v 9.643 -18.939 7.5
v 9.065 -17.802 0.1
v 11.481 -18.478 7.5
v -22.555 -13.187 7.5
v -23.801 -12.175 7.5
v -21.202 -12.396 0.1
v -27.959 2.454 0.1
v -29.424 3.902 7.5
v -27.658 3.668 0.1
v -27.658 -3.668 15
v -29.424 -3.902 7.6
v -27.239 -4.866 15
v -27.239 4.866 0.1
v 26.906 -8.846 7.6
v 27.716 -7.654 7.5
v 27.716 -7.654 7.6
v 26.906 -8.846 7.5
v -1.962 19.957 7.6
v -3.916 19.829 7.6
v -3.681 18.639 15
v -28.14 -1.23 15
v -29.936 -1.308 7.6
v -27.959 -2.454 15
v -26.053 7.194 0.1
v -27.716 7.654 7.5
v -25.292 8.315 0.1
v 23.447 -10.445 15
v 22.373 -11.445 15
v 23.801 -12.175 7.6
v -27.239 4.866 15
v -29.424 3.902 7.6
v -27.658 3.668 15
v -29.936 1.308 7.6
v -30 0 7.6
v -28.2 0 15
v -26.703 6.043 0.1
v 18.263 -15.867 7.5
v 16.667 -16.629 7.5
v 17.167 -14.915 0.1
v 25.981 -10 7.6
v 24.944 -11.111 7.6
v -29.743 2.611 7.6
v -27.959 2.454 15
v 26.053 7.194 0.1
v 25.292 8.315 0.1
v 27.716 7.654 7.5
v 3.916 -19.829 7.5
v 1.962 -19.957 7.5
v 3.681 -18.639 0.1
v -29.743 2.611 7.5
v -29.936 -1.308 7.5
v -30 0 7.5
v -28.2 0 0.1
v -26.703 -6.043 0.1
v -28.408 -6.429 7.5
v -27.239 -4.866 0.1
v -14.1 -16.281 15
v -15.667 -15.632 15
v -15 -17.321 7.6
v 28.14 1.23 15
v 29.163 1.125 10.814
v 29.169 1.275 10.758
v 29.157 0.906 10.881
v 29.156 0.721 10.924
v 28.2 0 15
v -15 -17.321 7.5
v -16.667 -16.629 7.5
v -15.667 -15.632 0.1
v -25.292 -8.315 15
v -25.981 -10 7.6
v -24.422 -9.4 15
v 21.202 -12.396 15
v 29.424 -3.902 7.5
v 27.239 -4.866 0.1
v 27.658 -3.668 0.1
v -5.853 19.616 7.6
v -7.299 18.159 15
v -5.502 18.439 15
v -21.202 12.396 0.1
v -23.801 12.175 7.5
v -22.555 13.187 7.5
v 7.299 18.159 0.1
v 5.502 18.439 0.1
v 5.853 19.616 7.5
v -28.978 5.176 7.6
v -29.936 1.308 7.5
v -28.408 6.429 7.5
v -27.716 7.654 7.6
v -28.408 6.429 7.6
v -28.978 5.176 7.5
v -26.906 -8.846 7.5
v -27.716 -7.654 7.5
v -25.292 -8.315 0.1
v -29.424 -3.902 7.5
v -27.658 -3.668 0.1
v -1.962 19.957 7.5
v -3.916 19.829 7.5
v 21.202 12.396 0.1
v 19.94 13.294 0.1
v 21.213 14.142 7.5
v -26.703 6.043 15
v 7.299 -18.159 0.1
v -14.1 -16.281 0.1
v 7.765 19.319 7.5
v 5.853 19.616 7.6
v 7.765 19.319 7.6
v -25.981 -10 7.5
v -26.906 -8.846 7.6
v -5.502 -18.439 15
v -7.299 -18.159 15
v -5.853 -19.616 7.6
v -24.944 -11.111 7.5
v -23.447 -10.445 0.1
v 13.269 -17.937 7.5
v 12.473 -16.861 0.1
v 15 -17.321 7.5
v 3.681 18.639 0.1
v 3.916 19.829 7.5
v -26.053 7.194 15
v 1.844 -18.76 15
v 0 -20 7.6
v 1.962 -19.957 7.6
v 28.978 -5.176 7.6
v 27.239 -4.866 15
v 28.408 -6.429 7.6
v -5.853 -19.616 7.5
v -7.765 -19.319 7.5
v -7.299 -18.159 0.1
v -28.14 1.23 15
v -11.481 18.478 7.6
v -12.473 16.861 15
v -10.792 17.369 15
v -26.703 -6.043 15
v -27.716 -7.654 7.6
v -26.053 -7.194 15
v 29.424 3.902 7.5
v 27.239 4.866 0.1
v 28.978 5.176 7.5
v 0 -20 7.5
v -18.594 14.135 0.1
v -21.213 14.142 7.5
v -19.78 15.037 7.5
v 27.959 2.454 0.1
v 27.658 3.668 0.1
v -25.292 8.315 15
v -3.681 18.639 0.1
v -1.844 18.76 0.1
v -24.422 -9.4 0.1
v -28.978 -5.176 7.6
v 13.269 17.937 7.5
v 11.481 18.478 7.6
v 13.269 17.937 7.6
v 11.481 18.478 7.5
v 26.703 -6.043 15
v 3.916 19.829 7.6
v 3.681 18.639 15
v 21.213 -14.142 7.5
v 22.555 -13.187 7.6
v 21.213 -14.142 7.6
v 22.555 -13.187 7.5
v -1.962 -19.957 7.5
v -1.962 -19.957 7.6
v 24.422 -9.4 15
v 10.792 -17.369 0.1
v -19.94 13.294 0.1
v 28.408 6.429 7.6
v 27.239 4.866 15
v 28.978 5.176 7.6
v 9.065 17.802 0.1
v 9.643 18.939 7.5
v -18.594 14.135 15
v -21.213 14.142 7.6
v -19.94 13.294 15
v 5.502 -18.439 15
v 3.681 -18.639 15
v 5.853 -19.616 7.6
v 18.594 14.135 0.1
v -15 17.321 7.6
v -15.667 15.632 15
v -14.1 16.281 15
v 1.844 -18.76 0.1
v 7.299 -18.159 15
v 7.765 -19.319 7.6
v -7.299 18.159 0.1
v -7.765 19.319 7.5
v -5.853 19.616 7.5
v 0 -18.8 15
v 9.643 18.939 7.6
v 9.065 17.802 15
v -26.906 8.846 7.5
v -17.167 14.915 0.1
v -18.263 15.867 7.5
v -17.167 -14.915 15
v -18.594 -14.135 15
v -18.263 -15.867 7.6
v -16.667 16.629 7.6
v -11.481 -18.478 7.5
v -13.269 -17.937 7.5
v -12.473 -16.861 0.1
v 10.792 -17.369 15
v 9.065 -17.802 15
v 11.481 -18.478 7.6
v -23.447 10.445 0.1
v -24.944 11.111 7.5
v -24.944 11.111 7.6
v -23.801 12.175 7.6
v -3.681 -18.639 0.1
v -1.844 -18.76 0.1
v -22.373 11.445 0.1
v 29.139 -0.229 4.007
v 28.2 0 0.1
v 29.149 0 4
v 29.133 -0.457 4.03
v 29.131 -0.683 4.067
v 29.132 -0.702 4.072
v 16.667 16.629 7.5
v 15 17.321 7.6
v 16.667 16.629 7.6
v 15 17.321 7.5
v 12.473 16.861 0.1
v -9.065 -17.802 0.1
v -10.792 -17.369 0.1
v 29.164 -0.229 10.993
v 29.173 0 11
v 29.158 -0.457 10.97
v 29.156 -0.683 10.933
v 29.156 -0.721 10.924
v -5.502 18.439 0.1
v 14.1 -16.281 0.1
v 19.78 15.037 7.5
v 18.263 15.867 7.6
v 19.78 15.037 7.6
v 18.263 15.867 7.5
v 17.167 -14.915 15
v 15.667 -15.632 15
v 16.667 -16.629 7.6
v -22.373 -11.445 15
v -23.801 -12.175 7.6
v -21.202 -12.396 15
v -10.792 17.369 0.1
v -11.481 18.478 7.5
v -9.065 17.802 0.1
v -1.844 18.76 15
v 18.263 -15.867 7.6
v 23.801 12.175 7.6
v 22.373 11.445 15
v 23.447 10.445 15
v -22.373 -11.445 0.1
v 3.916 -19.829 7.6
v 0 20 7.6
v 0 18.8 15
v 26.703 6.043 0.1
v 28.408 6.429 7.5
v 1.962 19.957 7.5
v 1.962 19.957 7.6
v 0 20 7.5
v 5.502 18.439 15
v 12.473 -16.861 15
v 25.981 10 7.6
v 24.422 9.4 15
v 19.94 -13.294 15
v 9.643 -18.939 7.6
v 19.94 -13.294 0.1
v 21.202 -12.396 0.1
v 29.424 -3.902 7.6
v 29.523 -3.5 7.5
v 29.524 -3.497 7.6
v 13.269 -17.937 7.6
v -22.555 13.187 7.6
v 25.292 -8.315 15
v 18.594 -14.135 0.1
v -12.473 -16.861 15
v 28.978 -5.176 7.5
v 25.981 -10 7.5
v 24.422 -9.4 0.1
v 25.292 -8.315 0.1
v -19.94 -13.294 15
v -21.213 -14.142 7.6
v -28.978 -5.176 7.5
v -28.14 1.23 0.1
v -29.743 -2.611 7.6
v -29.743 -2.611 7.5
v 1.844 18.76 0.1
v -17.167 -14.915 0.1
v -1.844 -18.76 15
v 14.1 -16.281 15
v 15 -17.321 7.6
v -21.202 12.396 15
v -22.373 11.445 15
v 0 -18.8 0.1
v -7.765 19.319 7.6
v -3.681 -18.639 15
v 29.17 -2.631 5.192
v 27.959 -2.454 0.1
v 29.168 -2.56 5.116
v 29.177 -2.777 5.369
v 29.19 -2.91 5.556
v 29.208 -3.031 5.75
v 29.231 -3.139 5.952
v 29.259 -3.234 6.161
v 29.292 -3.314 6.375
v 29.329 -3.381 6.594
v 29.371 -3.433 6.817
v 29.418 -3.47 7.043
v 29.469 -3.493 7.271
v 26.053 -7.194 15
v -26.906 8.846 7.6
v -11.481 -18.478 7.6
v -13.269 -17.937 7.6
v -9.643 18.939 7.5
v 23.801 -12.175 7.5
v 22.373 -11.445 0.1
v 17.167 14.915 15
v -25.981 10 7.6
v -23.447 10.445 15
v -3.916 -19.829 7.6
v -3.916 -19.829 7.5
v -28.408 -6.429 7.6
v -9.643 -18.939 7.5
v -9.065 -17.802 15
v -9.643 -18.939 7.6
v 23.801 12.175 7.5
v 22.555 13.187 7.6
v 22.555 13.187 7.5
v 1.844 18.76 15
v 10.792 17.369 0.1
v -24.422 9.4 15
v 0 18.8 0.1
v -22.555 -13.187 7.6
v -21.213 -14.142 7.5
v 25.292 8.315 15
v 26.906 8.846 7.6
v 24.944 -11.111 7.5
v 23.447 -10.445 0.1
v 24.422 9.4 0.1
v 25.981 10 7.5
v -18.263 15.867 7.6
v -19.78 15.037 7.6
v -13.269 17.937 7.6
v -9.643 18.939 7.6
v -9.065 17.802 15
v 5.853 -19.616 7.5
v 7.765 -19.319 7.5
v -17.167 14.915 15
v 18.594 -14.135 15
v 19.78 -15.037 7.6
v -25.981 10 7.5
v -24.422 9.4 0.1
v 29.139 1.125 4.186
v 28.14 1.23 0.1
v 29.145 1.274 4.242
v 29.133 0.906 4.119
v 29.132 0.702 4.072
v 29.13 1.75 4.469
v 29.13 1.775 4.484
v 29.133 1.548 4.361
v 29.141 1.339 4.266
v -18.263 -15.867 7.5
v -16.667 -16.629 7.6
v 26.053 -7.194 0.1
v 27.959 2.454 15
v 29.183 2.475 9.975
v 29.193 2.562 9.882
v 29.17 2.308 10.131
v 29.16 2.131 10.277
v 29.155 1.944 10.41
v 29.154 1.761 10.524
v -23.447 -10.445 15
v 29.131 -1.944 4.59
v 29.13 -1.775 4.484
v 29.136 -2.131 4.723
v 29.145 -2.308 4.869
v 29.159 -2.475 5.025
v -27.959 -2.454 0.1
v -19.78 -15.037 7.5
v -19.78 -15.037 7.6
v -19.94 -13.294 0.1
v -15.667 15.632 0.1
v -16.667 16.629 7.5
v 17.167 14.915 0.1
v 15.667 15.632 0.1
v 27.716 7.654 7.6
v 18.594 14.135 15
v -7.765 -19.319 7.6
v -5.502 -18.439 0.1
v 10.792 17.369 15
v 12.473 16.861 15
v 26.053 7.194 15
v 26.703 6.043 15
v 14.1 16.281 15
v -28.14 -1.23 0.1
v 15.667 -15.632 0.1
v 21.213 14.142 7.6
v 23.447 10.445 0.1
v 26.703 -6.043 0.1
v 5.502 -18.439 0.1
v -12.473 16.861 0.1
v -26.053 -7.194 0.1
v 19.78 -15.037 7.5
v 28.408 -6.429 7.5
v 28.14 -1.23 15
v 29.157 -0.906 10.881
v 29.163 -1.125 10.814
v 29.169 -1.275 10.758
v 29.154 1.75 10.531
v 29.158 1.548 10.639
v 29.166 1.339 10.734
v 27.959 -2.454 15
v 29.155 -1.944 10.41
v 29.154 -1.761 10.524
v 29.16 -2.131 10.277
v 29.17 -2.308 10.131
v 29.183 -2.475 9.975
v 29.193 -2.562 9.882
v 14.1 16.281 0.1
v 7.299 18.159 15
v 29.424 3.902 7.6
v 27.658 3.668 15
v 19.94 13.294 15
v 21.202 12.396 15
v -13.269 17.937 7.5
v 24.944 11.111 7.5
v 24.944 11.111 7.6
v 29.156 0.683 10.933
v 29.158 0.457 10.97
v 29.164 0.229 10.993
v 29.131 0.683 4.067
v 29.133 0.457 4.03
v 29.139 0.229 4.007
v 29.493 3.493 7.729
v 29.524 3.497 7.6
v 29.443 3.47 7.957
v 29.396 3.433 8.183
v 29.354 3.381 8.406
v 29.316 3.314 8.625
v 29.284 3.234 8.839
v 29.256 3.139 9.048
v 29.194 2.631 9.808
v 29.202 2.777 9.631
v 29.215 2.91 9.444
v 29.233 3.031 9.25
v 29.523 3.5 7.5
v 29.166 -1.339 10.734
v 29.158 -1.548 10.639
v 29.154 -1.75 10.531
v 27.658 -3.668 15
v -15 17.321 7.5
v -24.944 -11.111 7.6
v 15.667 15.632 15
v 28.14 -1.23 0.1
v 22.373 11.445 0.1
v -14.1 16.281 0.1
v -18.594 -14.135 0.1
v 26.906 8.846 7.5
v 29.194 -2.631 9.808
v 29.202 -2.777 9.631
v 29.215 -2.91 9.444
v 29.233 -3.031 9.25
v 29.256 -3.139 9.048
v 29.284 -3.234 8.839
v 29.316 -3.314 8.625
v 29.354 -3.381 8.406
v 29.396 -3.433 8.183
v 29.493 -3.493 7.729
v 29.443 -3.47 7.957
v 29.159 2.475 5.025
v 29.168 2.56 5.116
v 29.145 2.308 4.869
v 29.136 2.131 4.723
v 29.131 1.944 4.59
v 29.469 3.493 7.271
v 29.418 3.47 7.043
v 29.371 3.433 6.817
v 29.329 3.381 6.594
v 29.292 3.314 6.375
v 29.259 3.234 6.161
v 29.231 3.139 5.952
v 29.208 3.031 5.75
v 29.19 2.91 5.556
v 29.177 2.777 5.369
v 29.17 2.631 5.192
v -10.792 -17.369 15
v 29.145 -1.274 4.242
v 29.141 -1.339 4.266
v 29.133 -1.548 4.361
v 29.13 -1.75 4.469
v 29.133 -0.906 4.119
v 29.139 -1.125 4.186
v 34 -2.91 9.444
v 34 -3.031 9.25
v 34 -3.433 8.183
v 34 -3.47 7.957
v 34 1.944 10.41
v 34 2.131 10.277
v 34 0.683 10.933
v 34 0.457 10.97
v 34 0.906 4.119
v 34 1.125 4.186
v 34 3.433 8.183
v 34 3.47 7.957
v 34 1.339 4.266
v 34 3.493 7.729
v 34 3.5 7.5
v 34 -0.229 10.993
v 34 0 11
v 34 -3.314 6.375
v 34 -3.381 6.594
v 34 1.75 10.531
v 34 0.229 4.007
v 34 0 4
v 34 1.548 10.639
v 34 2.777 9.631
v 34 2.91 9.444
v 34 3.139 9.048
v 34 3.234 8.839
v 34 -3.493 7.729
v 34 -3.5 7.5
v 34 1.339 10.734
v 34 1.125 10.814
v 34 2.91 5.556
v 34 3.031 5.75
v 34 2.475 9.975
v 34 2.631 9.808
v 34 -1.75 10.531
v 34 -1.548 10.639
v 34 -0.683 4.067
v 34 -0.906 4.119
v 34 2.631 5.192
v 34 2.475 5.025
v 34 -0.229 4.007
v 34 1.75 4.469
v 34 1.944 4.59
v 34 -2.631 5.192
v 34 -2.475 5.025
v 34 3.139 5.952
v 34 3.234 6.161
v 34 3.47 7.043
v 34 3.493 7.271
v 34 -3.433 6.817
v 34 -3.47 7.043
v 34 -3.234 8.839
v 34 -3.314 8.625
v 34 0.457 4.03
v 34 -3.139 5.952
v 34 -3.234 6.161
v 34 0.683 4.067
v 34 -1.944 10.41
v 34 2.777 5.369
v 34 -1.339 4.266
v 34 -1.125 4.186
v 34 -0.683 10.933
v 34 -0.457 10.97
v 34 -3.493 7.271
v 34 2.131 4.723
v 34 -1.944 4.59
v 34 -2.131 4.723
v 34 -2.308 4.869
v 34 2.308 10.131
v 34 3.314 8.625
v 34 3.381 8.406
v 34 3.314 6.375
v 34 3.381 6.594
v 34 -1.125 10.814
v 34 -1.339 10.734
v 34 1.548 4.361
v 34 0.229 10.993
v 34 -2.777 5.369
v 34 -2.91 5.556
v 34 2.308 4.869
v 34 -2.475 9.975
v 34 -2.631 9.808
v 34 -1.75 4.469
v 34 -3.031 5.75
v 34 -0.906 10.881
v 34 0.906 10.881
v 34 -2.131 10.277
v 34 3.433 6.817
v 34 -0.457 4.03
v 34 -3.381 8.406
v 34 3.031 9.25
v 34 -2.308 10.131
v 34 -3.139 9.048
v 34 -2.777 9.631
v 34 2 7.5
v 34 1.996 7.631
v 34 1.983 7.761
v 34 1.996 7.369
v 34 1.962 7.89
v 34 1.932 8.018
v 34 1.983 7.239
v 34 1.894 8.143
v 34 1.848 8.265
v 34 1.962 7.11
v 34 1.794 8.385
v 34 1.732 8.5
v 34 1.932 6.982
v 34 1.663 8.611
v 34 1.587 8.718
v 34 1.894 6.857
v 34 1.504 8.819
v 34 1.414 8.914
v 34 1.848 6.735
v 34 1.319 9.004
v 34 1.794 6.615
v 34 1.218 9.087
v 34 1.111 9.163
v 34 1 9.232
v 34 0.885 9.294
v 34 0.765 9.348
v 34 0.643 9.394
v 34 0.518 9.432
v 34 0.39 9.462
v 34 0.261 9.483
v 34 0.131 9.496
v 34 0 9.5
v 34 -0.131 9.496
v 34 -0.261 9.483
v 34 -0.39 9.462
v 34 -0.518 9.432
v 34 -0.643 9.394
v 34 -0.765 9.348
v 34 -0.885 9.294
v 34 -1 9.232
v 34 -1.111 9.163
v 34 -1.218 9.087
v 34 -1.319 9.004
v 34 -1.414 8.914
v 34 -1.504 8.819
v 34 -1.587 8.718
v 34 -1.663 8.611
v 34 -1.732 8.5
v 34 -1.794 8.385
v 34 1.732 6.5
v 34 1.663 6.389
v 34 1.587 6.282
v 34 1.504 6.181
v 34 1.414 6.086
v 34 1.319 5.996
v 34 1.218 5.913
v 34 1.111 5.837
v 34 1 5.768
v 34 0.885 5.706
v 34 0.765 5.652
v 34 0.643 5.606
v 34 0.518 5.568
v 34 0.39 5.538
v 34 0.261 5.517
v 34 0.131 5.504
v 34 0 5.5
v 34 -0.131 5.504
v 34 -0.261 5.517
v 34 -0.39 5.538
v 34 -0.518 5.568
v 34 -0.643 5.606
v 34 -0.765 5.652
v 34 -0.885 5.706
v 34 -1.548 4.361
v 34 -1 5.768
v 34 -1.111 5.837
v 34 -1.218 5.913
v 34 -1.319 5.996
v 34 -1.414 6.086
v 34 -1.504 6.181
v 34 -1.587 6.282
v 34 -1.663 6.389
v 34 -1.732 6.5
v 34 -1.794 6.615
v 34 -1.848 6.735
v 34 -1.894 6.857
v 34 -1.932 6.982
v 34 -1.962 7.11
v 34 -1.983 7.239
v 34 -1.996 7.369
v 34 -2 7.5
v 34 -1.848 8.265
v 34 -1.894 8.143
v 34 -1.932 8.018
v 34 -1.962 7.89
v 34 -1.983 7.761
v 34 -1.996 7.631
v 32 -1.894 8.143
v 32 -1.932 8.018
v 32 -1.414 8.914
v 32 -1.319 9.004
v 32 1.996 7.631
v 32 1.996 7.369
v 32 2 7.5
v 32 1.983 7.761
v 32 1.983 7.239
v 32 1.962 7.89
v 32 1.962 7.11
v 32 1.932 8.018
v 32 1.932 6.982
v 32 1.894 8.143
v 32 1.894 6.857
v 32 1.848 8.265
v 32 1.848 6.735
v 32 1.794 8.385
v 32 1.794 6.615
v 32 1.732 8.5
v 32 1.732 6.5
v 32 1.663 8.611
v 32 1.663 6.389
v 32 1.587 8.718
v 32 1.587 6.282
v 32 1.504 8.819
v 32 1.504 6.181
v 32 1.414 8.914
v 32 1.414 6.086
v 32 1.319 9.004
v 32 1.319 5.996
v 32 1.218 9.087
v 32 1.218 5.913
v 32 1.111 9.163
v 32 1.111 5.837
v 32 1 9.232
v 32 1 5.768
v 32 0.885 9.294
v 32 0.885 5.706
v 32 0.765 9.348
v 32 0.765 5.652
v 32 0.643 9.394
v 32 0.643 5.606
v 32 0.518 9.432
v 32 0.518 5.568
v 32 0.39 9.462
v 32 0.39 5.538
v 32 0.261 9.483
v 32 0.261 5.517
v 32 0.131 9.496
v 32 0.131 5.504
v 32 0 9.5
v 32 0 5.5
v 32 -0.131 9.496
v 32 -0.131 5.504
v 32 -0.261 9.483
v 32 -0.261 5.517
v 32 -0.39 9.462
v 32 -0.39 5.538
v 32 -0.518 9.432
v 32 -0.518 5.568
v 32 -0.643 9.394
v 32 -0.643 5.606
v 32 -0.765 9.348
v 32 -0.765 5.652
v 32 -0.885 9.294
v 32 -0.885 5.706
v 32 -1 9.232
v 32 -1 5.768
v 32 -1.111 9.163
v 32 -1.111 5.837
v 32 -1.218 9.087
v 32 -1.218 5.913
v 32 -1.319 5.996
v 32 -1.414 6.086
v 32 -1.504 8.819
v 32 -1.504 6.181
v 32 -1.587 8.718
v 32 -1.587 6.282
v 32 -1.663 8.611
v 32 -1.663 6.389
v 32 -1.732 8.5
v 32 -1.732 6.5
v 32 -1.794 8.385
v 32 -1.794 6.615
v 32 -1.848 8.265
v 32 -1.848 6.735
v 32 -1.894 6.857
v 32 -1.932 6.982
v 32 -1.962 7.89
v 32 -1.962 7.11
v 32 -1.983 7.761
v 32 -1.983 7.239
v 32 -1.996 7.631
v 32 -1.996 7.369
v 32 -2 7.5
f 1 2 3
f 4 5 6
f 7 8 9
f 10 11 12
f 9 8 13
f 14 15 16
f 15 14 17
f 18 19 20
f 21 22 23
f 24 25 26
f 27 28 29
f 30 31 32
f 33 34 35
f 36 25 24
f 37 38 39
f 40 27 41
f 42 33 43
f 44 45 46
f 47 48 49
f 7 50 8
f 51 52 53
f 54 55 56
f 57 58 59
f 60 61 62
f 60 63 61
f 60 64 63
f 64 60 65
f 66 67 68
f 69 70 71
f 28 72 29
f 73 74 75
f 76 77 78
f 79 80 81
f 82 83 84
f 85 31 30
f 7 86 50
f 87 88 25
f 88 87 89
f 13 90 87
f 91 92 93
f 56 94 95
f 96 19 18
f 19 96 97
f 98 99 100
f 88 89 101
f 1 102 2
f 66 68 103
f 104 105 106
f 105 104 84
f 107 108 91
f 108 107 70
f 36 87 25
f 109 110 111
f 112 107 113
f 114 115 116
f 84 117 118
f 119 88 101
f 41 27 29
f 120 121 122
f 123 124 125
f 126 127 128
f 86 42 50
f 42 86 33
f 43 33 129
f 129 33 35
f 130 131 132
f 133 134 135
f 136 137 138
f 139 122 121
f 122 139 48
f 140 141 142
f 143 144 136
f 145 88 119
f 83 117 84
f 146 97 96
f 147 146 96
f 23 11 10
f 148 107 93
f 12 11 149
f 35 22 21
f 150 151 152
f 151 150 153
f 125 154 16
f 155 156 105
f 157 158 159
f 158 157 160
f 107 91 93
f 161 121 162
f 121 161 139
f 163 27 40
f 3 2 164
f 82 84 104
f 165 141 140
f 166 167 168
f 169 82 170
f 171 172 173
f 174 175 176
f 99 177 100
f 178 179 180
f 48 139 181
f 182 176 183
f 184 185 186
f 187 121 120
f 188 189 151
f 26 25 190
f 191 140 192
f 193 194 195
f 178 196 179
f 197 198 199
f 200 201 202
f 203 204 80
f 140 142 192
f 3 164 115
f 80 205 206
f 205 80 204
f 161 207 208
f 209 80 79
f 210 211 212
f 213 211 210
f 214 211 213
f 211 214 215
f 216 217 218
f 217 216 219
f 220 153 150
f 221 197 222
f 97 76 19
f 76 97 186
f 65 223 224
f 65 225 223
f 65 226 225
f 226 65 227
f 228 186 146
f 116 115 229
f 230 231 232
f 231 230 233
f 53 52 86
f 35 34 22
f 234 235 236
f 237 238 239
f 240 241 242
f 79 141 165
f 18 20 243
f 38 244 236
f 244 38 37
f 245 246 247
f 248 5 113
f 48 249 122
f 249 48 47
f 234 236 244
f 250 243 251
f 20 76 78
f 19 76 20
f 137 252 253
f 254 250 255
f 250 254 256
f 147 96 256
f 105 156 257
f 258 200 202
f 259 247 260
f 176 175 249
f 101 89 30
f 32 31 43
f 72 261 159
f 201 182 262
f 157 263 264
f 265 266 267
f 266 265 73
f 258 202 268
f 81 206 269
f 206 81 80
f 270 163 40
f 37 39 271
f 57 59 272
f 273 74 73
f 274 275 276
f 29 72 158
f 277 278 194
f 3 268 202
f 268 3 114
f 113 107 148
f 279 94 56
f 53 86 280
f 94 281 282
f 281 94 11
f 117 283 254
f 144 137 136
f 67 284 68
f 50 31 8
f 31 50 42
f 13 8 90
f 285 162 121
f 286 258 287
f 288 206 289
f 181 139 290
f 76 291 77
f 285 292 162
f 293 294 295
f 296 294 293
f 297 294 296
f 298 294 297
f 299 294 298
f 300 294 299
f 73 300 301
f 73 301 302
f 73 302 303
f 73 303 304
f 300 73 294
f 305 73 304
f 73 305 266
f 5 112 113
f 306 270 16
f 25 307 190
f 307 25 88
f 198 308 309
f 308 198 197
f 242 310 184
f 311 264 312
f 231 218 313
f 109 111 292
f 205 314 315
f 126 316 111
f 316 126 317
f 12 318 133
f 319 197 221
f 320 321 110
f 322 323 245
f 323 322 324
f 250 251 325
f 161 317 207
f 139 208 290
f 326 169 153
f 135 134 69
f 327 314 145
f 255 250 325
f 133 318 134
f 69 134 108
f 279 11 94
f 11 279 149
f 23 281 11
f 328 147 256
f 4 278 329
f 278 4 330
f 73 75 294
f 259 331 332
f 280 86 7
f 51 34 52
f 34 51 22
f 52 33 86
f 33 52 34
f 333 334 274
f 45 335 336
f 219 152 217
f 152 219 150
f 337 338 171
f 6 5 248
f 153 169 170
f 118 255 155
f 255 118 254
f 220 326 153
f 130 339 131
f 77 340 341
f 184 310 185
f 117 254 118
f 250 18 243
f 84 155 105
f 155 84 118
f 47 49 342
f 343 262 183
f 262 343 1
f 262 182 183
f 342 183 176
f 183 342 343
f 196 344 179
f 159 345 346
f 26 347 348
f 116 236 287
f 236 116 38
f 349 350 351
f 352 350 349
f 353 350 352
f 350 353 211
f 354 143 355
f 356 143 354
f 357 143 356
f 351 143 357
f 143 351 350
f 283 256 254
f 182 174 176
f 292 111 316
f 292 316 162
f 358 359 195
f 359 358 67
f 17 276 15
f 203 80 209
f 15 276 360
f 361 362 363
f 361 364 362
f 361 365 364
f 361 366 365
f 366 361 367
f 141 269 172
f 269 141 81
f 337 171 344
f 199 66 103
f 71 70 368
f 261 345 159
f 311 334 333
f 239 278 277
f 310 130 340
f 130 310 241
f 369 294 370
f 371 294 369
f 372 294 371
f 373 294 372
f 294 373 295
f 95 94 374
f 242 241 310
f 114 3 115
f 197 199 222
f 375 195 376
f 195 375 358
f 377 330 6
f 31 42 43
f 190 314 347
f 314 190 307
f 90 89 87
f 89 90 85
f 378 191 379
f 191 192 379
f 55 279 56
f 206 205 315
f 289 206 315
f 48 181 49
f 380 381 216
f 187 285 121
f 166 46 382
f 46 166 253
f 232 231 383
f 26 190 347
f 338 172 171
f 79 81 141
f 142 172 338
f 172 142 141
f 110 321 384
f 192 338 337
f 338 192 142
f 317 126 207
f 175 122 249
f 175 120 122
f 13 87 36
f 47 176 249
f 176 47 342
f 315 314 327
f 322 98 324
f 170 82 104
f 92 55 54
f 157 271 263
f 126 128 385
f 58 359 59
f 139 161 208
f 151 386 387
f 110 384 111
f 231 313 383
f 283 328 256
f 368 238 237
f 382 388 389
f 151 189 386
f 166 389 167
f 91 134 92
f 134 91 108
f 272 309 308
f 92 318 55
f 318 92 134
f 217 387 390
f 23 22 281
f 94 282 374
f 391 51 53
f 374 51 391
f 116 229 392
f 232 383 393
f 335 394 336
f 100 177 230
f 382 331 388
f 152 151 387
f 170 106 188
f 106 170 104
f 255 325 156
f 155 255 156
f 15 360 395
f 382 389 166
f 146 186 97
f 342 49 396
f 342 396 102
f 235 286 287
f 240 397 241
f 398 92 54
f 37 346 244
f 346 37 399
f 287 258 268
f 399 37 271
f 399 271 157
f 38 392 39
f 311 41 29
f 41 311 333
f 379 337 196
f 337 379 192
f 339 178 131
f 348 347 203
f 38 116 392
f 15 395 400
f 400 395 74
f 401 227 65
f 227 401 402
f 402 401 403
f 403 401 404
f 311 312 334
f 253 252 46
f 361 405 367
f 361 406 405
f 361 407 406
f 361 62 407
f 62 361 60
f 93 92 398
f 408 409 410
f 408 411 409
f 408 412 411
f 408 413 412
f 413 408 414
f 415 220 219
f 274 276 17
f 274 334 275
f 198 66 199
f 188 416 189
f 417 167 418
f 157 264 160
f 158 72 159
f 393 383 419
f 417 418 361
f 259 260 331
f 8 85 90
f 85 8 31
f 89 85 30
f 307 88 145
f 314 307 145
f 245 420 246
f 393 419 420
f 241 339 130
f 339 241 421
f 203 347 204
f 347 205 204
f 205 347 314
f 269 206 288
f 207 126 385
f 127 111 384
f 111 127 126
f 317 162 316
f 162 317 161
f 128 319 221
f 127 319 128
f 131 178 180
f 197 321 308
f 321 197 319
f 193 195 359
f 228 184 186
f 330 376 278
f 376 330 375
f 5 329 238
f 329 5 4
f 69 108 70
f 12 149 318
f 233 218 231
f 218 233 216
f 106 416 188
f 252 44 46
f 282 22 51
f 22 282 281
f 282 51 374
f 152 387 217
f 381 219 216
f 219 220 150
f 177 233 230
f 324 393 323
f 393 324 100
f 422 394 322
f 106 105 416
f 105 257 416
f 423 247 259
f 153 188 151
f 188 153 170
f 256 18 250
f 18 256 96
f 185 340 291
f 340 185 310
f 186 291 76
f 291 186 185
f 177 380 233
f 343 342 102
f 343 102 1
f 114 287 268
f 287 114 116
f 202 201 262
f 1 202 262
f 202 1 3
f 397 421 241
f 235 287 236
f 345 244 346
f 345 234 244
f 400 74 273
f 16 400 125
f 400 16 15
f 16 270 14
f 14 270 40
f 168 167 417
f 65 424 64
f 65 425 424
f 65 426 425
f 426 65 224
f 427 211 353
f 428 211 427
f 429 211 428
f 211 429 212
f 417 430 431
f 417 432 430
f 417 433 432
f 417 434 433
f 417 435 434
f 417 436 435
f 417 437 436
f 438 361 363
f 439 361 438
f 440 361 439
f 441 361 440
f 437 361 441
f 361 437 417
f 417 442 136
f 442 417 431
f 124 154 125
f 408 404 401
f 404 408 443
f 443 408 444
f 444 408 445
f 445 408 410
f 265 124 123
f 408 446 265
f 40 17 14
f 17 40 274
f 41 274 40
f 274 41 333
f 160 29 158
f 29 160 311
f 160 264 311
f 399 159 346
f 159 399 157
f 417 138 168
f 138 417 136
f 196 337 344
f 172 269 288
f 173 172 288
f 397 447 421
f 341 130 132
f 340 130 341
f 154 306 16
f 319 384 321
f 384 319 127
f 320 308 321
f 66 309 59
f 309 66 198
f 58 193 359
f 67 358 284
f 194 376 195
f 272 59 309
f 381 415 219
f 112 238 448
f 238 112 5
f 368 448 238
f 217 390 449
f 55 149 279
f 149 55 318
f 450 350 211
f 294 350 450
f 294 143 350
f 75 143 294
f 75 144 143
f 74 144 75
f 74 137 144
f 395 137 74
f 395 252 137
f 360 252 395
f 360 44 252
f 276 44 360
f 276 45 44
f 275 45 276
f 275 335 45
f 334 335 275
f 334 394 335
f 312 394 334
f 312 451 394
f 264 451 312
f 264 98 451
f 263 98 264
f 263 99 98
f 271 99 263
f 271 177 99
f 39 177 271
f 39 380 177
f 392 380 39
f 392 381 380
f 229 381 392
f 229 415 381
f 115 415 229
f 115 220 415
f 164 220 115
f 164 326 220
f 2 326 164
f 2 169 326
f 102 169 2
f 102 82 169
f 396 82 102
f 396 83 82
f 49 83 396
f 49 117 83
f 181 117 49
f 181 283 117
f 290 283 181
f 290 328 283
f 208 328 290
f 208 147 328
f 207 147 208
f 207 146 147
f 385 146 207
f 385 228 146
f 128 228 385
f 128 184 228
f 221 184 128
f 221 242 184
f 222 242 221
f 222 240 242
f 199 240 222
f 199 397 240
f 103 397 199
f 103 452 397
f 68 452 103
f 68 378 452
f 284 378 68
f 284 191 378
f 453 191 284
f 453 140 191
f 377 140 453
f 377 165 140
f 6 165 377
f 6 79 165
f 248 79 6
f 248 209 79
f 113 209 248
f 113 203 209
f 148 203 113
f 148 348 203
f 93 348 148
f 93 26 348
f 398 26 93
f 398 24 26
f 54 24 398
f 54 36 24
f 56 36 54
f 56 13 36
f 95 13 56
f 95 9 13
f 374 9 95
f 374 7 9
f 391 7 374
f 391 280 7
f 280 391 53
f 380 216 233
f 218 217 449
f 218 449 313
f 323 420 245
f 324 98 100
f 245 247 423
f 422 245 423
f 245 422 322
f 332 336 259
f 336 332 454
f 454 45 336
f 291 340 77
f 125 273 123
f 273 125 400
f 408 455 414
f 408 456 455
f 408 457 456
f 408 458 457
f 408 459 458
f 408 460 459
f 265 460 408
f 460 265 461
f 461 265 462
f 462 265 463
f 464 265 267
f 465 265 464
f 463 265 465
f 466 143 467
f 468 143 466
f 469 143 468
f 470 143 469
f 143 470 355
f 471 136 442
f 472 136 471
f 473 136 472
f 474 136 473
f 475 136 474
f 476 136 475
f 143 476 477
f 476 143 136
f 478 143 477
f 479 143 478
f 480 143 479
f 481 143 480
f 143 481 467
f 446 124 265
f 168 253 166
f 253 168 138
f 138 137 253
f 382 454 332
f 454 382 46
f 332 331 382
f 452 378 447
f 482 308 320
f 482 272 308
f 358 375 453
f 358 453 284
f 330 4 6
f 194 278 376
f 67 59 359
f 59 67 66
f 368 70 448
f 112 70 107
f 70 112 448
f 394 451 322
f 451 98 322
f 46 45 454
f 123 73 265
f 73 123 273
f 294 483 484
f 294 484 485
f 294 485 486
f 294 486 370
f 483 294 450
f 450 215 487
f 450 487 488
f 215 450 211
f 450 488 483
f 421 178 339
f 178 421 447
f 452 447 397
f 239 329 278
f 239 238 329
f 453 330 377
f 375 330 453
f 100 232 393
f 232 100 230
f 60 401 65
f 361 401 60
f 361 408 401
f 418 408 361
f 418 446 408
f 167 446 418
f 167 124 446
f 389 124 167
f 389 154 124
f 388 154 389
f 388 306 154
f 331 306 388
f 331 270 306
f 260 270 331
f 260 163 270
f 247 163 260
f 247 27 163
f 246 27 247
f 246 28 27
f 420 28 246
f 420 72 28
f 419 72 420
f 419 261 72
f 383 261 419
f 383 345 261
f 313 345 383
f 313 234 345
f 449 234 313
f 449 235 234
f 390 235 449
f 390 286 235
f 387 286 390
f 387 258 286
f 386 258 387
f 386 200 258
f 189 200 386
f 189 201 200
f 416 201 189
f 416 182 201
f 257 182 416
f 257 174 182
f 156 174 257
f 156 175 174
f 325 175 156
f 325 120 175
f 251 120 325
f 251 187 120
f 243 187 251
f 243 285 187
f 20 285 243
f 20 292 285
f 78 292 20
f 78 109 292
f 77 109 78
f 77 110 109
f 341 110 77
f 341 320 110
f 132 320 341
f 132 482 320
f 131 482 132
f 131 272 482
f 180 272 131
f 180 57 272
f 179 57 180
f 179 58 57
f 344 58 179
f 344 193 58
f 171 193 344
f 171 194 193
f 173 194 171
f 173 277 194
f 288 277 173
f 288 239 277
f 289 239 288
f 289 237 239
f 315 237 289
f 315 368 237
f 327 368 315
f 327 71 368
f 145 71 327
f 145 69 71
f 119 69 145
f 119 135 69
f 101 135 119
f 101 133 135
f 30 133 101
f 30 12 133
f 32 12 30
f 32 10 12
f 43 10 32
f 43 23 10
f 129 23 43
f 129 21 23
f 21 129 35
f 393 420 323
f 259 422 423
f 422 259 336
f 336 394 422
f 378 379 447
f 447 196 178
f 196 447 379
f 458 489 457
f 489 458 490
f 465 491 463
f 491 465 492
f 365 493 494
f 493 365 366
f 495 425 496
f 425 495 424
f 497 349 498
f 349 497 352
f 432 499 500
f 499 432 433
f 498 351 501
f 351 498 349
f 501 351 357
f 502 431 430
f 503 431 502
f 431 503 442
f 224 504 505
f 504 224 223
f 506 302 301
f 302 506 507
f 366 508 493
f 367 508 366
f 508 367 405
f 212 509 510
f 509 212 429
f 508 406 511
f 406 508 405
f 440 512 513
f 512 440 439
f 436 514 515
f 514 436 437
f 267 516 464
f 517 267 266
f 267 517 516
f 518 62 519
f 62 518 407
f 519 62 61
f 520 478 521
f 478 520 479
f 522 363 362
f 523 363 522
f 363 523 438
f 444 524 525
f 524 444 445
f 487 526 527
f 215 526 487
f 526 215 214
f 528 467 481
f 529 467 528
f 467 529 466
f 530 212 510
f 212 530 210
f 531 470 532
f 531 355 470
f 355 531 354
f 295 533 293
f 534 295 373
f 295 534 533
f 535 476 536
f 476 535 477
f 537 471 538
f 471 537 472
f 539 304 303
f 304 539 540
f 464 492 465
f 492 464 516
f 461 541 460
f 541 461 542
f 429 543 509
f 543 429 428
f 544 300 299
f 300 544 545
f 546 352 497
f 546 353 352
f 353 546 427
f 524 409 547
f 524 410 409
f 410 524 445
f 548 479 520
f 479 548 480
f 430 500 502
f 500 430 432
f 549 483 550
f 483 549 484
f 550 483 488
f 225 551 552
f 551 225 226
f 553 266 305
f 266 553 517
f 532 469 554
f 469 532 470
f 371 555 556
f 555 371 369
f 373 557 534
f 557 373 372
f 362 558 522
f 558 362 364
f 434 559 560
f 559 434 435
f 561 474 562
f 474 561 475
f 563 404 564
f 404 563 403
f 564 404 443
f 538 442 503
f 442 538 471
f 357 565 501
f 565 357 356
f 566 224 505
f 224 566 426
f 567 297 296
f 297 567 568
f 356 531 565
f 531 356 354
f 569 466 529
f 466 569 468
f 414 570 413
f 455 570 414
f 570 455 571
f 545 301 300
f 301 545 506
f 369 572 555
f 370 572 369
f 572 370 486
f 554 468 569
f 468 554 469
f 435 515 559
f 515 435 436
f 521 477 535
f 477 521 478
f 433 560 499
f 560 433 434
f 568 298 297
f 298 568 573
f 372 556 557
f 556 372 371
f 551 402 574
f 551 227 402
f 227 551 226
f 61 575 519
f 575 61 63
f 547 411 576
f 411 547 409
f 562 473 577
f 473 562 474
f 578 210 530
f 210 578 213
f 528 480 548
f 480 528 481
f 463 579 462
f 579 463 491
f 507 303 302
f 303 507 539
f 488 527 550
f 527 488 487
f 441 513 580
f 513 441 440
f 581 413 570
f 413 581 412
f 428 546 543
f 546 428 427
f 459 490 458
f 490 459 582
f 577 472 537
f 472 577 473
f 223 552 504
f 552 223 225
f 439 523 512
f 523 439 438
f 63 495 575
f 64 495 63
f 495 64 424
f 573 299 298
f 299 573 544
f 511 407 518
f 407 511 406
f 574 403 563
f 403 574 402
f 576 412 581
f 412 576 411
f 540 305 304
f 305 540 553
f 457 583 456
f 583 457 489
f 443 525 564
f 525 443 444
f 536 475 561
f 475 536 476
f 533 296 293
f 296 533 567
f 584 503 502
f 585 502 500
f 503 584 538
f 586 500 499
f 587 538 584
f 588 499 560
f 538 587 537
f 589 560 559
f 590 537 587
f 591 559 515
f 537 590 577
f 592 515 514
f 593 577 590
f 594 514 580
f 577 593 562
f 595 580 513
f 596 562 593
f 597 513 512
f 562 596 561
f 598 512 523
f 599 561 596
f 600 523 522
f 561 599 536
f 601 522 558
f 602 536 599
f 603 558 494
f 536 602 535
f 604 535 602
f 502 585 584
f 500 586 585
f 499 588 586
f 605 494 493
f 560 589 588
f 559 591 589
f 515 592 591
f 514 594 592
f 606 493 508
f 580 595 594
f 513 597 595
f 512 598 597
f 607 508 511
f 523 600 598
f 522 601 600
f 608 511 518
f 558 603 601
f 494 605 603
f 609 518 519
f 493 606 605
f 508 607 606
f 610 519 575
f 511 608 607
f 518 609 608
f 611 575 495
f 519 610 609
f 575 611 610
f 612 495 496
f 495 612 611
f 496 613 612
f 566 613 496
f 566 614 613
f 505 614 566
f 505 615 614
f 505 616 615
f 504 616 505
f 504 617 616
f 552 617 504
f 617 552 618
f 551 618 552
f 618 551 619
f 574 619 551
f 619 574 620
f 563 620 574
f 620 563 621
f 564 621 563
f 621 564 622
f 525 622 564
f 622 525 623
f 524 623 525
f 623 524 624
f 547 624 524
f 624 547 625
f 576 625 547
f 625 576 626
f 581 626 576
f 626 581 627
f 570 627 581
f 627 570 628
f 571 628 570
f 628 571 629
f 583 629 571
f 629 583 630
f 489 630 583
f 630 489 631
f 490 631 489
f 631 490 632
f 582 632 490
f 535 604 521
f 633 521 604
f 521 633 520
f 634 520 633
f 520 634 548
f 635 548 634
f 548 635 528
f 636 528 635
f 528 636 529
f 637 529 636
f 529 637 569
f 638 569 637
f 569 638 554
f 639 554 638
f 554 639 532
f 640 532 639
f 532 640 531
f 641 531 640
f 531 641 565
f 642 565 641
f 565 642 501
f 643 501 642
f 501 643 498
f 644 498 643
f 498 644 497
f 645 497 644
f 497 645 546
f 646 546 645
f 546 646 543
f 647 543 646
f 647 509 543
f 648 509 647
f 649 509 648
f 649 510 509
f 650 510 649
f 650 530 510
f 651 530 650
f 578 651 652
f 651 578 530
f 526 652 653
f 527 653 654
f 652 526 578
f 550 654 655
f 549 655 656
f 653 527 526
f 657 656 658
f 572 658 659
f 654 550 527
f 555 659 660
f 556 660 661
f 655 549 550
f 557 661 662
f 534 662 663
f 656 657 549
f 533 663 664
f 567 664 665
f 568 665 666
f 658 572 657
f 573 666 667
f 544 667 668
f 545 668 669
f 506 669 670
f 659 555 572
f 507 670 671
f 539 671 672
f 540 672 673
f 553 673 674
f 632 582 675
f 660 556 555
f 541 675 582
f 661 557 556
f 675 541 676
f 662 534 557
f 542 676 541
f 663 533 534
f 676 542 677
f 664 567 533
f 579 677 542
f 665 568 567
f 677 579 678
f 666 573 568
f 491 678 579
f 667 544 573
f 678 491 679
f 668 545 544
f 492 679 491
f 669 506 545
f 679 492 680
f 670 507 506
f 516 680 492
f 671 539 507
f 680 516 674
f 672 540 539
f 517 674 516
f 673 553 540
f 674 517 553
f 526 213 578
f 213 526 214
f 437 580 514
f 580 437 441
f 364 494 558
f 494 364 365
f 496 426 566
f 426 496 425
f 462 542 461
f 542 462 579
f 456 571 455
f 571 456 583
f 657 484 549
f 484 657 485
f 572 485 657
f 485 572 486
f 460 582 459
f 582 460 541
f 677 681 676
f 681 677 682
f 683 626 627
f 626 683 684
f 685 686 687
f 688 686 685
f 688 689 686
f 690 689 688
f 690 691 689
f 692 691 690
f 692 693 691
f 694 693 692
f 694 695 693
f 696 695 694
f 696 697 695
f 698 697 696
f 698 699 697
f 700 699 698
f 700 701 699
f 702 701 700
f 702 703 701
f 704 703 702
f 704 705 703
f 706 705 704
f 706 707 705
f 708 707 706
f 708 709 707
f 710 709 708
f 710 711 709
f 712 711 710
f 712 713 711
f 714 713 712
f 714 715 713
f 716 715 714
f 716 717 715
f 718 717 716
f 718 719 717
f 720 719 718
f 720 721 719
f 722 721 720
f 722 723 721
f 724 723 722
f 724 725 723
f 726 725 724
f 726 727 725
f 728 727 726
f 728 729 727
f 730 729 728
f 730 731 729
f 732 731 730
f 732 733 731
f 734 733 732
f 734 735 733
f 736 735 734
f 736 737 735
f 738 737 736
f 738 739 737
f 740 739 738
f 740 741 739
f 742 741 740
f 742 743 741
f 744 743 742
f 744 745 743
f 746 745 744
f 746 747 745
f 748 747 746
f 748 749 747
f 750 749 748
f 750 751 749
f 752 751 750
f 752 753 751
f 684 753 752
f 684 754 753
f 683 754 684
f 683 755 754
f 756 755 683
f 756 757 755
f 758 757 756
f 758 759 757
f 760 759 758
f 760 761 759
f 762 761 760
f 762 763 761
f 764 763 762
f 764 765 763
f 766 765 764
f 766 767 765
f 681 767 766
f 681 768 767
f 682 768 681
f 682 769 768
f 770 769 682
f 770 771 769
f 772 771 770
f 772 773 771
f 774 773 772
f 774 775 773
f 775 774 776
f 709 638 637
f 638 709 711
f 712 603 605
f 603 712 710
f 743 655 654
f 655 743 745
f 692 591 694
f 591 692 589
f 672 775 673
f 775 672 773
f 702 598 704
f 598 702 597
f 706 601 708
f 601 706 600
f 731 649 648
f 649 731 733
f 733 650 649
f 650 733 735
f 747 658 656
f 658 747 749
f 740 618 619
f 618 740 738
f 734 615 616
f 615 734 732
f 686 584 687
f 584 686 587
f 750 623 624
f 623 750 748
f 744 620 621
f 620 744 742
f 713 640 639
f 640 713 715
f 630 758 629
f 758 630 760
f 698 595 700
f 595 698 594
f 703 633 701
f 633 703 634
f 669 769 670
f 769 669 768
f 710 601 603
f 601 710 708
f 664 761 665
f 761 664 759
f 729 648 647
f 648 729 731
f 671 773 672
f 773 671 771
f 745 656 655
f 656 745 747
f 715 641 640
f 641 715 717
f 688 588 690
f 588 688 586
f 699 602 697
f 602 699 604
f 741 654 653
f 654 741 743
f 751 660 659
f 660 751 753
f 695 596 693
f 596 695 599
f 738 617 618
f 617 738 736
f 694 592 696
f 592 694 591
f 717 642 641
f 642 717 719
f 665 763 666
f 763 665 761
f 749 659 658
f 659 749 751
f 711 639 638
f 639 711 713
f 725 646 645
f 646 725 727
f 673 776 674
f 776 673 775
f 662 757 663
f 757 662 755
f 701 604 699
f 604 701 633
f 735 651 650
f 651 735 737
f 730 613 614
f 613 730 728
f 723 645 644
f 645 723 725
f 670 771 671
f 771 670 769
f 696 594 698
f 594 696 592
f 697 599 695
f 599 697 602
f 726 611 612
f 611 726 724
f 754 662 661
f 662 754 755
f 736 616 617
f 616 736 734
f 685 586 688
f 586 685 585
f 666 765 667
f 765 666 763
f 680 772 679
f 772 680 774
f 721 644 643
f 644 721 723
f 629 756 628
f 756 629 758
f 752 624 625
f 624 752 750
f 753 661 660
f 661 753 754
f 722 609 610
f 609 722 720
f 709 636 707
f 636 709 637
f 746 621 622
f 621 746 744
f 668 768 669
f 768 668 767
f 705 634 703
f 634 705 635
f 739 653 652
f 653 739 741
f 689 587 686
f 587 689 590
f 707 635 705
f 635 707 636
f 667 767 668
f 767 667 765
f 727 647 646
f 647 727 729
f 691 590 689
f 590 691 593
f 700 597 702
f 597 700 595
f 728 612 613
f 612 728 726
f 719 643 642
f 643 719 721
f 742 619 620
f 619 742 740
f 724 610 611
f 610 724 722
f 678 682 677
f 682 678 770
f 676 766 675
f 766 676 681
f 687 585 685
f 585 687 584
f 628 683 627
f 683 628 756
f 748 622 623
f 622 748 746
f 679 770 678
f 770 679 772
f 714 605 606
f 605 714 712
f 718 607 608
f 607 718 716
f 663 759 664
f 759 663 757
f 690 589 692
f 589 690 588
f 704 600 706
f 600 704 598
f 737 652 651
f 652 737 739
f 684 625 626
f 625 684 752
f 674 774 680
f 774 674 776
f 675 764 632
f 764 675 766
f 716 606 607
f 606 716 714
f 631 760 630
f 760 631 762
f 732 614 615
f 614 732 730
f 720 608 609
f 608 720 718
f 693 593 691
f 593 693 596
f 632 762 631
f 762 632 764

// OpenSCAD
// ============================================================
// Smart Tourniquet System — Focal Pressure Pad (FPP)
// Kelompok 19 — Desain Proyek Teknik Elektro, Komputer, Biomedik 2
//
// Oval 60x40mm, ketebalan maks 15mm, kantung TPU + silikon medis A50.
// render_mode: "inflated" (visual+FEM) / "mold_bottom" / "mold_top"
// ============================================================

$fn = 96;

pad_length = 60; pad_width = 40; pad_max_thickness = 15;
connector_d = 4; connector_od = 7; connector_length = 8;

module oval_profile(l, w) { scale([l/2, w/2, 1]) circle(r=1, $fn=$fn); }

module inflated_pad() {
    union() {
        hull() {
            translate([0,0,0.1]) linear_extrude(height=0.1) oval_profile(pad_length*0.94, pad_width*0.94);
            translate([0,0,pad_max_thickness/2]) linear_extrude(height=0.1) oval_profile(pad_length, pad_width);
            translate([0,0,pad_max_thickness-0.1]) linear_extrude(height=0.1) oval_profile(pad_length*0.94, pad_width*0.94);
        }
        translate([pad_length/2-4, 0, pad_max_thickness/2])
            rotate([0,90,0]) cylinder(h=connector_length, d=connector_od);
    }
}
module inflated_pad_with_channel() {
    difference() {
        inflated_pad();
        translate([pad_length/2-4+connector_length-2, 0, pad_max_thickness/2])
            rotate([0,90,0]) cylinder(h=connector_length+4, d=connector_d);
    }
}
module mold_cavity_bottom() {
    block_margin = 6;
    block_l = pad_length + 2*block_margin;
    block_w = pad_width + 2*block_margin;
    block_h = pad_max_thickness/2 + block_margin;
    difference() {
        translate([-block_l/2, -block_w/2, 0]) cube([block_l, block_w, block_h]);
        translate([0,0,block_h]) scale([1,1,-1])
            hull() {
                linear_extrude(height=0.1) oval_profile(pad_length*0.94, pad_width*0.94);
                translate([0,0,pad_max_thickness/2-0.1]) linear_extrude(height=0.1) oval_profile(pad_length, pad_width);
            }
        translate([pad_length/2+block_margin/2, 0, -0.1]) cylinder(h=5, d=3);
        translate([-pad_length/2-block_margin/2, 0, -0.1]) cylinder(h=5, d=3);
    }
}
module mold_cavity_top() {
    mirror([0,0,1]) translate([0,0,-((pad_max_thickness/2)+6)]) mold_cavity_bottom();
}

render_mode = "inflated";
if (render_mode == "inflated") { inflated_pad_with_channel(); }
else if (render_mode == "mold_bottom") { mold_cavity_bottom(); }
else if (render_mode == "mold_top") { mold_cavity_top(); }
